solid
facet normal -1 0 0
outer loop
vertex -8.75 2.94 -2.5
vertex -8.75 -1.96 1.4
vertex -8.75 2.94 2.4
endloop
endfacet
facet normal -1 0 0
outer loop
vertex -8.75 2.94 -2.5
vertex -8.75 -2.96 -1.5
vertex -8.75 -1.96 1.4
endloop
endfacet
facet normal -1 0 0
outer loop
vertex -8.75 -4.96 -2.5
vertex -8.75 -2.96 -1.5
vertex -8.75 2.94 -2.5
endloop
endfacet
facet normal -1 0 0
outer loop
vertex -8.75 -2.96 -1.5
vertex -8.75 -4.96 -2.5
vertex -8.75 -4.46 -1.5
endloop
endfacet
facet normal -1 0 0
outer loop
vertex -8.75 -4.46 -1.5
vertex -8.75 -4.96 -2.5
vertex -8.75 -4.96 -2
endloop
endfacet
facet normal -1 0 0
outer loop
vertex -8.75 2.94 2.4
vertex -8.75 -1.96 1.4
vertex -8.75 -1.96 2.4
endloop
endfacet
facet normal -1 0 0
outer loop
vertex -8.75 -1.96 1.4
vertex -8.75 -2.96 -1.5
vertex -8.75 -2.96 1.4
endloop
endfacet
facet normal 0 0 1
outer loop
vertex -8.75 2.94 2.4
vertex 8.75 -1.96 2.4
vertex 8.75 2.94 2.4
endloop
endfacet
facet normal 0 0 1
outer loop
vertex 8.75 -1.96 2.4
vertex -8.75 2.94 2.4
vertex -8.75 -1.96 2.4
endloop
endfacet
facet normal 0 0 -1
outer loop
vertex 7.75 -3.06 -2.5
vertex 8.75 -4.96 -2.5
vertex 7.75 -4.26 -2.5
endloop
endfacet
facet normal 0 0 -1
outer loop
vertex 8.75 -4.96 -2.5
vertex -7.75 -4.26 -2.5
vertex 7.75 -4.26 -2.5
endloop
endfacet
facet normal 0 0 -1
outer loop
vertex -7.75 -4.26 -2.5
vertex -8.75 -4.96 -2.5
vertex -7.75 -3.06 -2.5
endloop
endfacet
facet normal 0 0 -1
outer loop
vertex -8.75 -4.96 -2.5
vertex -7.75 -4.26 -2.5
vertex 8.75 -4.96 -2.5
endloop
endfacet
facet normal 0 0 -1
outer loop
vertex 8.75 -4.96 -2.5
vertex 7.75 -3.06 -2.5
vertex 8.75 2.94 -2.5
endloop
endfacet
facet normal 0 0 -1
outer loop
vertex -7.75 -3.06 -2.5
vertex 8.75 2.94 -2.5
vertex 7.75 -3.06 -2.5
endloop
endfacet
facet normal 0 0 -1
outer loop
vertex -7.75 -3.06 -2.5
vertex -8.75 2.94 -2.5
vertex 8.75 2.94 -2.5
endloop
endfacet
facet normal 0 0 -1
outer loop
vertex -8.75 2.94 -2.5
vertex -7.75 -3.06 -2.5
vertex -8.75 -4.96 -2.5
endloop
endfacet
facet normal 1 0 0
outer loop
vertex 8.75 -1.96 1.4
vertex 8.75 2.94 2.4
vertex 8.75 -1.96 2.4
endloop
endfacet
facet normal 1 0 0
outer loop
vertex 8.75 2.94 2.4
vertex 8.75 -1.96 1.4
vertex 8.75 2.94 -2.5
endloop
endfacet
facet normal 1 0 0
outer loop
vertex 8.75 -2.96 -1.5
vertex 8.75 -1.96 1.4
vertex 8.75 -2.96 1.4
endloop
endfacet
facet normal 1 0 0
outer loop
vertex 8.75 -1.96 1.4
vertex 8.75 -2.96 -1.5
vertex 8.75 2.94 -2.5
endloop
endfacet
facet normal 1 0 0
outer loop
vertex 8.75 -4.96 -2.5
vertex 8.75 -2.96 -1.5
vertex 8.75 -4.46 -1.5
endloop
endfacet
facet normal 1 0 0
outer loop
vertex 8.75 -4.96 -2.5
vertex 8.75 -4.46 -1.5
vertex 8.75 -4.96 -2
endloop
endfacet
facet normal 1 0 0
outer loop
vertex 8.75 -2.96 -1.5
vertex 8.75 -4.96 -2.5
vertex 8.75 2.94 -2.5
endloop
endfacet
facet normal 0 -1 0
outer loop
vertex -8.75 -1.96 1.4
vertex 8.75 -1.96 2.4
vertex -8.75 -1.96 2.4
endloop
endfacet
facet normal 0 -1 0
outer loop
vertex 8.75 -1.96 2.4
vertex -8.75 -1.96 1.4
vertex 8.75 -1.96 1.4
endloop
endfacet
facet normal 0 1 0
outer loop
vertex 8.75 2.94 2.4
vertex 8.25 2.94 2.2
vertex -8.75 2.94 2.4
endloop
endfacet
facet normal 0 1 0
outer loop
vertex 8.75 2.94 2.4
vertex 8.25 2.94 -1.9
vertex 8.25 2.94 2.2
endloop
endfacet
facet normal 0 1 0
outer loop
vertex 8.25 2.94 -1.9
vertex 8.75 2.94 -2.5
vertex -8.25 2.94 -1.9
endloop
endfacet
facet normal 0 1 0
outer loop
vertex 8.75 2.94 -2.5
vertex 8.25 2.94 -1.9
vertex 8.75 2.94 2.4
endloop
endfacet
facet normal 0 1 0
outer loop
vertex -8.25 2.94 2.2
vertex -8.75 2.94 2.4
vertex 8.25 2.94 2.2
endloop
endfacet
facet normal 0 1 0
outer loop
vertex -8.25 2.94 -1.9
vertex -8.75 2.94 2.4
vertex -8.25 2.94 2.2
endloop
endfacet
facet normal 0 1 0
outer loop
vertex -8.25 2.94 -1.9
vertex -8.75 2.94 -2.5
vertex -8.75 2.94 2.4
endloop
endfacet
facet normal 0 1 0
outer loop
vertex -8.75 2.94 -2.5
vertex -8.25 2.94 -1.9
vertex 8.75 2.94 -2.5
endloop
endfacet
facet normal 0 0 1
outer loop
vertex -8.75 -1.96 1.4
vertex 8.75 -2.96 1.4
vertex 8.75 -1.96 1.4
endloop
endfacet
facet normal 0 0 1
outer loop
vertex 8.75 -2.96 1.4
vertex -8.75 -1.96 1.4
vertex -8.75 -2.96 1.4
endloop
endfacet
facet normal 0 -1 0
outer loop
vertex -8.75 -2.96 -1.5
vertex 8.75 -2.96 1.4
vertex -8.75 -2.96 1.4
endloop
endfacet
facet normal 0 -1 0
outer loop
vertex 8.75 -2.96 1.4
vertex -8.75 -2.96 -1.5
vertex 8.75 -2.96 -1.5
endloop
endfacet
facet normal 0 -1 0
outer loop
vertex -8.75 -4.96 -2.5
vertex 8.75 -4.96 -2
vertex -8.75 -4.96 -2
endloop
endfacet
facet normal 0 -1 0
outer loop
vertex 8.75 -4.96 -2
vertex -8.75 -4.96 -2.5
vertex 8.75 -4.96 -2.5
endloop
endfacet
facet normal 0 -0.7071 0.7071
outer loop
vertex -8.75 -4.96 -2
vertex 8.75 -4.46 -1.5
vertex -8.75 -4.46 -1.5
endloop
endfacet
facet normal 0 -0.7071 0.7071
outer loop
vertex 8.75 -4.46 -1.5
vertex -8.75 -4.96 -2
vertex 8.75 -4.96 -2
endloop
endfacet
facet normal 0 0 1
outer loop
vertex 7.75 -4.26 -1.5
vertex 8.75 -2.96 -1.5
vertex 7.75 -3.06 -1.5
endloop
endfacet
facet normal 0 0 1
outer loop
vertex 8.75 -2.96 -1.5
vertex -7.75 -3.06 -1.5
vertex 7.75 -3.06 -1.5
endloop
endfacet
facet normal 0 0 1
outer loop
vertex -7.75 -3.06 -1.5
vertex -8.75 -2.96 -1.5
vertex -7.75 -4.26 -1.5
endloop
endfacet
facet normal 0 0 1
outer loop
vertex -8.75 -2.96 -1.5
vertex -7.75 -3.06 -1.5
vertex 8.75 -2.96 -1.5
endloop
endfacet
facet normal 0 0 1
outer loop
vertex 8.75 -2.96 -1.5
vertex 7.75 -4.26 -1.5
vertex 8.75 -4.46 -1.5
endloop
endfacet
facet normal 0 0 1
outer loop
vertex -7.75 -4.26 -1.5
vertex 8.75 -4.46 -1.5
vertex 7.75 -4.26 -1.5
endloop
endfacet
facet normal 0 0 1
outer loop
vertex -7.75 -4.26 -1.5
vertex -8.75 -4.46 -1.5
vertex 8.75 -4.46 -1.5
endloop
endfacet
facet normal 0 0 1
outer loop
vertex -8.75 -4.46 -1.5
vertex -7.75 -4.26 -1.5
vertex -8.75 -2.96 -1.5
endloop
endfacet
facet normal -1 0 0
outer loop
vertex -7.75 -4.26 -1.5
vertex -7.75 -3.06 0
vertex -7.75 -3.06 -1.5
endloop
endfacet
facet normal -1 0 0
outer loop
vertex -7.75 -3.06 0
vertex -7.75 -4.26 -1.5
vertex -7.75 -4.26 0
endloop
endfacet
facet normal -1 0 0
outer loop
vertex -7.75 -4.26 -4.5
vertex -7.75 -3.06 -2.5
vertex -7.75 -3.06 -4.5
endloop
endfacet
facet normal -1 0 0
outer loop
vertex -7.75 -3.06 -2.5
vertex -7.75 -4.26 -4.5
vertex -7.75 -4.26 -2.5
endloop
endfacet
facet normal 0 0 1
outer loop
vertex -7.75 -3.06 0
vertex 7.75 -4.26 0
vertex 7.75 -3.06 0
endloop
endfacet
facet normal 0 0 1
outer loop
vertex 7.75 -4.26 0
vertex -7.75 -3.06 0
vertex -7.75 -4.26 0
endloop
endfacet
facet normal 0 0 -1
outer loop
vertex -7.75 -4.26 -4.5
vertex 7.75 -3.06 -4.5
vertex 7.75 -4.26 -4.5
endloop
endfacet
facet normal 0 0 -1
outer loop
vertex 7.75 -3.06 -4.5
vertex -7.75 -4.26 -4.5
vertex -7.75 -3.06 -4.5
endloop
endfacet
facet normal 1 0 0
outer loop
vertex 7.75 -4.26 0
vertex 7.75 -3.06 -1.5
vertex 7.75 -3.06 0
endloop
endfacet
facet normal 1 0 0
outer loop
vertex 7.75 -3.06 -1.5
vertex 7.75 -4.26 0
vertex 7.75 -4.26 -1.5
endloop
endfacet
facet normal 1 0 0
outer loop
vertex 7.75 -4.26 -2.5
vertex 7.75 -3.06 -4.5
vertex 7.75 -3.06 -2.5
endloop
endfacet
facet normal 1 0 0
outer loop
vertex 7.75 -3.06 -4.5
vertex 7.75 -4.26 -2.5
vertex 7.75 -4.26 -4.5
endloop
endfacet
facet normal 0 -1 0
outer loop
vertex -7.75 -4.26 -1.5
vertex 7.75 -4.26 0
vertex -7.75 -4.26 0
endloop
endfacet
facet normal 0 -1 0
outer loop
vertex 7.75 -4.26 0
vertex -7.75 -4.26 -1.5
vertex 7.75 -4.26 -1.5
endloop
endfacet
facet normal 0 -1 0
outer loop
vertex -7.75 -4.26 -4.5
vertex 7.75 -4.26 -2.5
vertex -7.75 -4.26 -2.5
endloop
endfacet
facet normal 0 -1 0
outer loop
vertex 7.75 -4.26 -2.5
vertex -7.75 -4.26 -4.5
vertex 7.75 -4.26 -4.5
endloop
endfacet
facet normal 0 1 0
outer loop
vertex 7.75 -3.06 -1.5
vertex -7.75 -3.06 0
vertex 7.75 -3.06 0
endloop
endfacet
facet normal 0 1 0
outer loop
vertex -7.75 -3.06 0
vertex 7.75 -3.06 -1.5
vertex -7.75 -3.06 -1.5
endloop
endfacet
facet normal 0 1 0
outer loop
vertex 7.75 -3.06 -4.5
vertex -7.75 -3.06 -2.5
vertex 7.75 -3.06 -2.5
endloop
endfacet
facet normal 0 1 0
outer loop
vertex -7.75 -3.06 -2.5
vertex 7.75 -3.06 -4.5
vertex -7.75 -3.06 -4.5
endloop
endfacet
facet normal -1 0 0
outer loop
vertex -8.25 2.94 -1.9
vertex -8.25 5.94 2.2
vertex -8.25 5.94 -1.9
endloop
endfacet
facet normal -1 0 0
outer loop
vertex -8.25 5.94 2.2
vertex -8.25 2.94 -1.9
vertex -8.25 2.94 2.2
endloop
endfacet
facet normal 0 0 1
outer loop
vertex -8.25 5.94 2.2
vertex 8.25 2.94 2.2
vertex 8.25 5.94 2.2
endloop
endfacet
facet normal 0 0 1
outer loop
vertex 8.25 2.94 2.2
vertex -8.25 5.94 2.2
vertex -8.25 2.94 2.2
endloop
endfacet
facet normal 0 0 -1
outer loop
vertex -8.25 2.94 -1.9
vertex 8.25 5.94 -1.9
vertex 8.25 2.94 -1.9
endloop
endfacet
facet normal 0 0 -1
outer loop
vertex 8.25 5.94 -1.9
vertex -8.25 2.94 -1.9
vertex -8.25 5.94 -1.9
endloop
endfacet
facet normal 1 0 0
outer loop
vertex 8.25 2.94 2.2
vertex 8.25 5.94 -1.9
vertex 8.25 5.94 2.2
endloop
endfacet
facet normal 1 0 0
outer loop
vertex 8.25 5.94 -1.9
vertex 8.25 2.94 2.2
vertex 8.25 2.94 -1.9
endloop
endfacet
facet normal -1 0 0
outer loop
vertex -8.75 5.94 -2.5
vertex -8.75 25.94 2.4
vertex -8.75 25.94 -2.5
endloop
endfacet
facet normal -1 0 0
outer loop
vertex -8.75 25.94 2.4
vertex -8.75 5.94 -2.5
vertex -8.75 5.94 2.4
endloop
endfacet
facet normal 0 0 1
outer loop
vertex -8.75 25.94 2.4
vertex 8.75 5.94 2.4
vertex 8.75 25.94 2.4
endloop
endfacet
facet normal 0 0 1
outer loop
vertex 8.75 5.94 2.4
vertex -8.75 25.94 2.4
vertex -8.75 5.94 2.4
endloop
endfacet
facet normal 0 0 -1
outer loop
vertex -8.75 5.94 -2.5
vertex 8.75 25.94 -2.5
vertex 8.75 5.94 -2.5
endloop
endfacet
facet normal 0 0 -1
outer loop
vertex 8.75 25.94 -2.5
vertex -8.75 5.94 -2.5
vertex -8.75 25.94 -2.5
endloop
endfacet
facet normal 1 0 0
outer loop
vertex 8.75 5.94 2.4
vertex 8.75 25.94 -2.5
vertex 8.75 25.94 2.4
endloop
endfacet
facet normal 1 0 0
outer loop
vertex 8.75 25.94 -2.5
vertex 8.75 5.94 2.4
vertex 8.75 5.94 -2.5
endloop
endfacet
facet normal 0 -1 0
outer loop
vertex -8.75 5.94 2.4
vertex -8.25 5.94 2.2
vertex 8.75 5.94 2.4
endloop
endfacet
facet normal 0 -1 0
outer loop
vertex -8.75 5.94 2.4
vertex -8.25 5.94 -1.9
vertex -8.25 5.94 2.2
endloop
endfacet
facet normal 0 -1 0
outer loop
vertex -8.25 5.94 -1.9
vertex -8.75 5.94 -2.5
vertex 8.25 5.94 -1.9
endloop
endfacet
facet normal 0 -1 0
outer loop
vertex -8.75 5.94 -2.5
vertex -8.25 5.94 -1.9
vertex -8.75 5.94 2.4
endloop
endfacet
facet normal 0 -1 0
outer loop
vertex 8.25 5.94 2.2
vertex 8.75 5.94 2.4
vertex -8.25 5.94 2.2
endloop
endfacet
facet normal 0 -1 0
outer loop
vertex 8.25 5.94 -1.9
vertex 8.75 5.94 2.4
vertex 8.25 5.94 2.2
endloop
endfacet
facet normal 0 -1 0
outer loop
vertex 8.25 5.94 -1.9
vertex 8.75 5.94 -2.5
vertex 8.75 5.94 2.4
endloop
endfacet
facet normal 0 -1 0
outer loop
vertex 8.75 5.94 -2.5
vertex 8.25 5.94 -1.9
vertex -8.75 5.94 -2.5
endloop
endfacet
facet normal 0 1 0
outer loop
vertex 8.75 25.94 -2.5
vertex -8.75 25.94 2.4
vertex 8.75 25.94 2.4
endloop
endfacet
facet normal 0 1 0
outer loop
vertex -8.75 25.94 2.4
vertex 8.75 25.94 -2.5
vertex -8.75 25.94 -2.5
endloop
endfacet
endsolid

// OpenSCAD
N=6;
A=2.5+N*2.5;
rotate([0,0,180])
translate([-A/2,-2.94,-2.5])
{
	cube([A,4.9,4.9]);
	cube([A,5.9,3.9]);
	hull()
	{
		cube([A,7.4,1]);
		cube([A,7.9,0.5]);
	}
	translate([1,6,-2])cube([A-2,1.2,4.5]); // Assumes cropped pins
	// Plug
	translate([0.5,-20,0.6])cube([A-1,21,4.1]);
	translate([0,-23,0])cube([A,20,4.9]);
}
